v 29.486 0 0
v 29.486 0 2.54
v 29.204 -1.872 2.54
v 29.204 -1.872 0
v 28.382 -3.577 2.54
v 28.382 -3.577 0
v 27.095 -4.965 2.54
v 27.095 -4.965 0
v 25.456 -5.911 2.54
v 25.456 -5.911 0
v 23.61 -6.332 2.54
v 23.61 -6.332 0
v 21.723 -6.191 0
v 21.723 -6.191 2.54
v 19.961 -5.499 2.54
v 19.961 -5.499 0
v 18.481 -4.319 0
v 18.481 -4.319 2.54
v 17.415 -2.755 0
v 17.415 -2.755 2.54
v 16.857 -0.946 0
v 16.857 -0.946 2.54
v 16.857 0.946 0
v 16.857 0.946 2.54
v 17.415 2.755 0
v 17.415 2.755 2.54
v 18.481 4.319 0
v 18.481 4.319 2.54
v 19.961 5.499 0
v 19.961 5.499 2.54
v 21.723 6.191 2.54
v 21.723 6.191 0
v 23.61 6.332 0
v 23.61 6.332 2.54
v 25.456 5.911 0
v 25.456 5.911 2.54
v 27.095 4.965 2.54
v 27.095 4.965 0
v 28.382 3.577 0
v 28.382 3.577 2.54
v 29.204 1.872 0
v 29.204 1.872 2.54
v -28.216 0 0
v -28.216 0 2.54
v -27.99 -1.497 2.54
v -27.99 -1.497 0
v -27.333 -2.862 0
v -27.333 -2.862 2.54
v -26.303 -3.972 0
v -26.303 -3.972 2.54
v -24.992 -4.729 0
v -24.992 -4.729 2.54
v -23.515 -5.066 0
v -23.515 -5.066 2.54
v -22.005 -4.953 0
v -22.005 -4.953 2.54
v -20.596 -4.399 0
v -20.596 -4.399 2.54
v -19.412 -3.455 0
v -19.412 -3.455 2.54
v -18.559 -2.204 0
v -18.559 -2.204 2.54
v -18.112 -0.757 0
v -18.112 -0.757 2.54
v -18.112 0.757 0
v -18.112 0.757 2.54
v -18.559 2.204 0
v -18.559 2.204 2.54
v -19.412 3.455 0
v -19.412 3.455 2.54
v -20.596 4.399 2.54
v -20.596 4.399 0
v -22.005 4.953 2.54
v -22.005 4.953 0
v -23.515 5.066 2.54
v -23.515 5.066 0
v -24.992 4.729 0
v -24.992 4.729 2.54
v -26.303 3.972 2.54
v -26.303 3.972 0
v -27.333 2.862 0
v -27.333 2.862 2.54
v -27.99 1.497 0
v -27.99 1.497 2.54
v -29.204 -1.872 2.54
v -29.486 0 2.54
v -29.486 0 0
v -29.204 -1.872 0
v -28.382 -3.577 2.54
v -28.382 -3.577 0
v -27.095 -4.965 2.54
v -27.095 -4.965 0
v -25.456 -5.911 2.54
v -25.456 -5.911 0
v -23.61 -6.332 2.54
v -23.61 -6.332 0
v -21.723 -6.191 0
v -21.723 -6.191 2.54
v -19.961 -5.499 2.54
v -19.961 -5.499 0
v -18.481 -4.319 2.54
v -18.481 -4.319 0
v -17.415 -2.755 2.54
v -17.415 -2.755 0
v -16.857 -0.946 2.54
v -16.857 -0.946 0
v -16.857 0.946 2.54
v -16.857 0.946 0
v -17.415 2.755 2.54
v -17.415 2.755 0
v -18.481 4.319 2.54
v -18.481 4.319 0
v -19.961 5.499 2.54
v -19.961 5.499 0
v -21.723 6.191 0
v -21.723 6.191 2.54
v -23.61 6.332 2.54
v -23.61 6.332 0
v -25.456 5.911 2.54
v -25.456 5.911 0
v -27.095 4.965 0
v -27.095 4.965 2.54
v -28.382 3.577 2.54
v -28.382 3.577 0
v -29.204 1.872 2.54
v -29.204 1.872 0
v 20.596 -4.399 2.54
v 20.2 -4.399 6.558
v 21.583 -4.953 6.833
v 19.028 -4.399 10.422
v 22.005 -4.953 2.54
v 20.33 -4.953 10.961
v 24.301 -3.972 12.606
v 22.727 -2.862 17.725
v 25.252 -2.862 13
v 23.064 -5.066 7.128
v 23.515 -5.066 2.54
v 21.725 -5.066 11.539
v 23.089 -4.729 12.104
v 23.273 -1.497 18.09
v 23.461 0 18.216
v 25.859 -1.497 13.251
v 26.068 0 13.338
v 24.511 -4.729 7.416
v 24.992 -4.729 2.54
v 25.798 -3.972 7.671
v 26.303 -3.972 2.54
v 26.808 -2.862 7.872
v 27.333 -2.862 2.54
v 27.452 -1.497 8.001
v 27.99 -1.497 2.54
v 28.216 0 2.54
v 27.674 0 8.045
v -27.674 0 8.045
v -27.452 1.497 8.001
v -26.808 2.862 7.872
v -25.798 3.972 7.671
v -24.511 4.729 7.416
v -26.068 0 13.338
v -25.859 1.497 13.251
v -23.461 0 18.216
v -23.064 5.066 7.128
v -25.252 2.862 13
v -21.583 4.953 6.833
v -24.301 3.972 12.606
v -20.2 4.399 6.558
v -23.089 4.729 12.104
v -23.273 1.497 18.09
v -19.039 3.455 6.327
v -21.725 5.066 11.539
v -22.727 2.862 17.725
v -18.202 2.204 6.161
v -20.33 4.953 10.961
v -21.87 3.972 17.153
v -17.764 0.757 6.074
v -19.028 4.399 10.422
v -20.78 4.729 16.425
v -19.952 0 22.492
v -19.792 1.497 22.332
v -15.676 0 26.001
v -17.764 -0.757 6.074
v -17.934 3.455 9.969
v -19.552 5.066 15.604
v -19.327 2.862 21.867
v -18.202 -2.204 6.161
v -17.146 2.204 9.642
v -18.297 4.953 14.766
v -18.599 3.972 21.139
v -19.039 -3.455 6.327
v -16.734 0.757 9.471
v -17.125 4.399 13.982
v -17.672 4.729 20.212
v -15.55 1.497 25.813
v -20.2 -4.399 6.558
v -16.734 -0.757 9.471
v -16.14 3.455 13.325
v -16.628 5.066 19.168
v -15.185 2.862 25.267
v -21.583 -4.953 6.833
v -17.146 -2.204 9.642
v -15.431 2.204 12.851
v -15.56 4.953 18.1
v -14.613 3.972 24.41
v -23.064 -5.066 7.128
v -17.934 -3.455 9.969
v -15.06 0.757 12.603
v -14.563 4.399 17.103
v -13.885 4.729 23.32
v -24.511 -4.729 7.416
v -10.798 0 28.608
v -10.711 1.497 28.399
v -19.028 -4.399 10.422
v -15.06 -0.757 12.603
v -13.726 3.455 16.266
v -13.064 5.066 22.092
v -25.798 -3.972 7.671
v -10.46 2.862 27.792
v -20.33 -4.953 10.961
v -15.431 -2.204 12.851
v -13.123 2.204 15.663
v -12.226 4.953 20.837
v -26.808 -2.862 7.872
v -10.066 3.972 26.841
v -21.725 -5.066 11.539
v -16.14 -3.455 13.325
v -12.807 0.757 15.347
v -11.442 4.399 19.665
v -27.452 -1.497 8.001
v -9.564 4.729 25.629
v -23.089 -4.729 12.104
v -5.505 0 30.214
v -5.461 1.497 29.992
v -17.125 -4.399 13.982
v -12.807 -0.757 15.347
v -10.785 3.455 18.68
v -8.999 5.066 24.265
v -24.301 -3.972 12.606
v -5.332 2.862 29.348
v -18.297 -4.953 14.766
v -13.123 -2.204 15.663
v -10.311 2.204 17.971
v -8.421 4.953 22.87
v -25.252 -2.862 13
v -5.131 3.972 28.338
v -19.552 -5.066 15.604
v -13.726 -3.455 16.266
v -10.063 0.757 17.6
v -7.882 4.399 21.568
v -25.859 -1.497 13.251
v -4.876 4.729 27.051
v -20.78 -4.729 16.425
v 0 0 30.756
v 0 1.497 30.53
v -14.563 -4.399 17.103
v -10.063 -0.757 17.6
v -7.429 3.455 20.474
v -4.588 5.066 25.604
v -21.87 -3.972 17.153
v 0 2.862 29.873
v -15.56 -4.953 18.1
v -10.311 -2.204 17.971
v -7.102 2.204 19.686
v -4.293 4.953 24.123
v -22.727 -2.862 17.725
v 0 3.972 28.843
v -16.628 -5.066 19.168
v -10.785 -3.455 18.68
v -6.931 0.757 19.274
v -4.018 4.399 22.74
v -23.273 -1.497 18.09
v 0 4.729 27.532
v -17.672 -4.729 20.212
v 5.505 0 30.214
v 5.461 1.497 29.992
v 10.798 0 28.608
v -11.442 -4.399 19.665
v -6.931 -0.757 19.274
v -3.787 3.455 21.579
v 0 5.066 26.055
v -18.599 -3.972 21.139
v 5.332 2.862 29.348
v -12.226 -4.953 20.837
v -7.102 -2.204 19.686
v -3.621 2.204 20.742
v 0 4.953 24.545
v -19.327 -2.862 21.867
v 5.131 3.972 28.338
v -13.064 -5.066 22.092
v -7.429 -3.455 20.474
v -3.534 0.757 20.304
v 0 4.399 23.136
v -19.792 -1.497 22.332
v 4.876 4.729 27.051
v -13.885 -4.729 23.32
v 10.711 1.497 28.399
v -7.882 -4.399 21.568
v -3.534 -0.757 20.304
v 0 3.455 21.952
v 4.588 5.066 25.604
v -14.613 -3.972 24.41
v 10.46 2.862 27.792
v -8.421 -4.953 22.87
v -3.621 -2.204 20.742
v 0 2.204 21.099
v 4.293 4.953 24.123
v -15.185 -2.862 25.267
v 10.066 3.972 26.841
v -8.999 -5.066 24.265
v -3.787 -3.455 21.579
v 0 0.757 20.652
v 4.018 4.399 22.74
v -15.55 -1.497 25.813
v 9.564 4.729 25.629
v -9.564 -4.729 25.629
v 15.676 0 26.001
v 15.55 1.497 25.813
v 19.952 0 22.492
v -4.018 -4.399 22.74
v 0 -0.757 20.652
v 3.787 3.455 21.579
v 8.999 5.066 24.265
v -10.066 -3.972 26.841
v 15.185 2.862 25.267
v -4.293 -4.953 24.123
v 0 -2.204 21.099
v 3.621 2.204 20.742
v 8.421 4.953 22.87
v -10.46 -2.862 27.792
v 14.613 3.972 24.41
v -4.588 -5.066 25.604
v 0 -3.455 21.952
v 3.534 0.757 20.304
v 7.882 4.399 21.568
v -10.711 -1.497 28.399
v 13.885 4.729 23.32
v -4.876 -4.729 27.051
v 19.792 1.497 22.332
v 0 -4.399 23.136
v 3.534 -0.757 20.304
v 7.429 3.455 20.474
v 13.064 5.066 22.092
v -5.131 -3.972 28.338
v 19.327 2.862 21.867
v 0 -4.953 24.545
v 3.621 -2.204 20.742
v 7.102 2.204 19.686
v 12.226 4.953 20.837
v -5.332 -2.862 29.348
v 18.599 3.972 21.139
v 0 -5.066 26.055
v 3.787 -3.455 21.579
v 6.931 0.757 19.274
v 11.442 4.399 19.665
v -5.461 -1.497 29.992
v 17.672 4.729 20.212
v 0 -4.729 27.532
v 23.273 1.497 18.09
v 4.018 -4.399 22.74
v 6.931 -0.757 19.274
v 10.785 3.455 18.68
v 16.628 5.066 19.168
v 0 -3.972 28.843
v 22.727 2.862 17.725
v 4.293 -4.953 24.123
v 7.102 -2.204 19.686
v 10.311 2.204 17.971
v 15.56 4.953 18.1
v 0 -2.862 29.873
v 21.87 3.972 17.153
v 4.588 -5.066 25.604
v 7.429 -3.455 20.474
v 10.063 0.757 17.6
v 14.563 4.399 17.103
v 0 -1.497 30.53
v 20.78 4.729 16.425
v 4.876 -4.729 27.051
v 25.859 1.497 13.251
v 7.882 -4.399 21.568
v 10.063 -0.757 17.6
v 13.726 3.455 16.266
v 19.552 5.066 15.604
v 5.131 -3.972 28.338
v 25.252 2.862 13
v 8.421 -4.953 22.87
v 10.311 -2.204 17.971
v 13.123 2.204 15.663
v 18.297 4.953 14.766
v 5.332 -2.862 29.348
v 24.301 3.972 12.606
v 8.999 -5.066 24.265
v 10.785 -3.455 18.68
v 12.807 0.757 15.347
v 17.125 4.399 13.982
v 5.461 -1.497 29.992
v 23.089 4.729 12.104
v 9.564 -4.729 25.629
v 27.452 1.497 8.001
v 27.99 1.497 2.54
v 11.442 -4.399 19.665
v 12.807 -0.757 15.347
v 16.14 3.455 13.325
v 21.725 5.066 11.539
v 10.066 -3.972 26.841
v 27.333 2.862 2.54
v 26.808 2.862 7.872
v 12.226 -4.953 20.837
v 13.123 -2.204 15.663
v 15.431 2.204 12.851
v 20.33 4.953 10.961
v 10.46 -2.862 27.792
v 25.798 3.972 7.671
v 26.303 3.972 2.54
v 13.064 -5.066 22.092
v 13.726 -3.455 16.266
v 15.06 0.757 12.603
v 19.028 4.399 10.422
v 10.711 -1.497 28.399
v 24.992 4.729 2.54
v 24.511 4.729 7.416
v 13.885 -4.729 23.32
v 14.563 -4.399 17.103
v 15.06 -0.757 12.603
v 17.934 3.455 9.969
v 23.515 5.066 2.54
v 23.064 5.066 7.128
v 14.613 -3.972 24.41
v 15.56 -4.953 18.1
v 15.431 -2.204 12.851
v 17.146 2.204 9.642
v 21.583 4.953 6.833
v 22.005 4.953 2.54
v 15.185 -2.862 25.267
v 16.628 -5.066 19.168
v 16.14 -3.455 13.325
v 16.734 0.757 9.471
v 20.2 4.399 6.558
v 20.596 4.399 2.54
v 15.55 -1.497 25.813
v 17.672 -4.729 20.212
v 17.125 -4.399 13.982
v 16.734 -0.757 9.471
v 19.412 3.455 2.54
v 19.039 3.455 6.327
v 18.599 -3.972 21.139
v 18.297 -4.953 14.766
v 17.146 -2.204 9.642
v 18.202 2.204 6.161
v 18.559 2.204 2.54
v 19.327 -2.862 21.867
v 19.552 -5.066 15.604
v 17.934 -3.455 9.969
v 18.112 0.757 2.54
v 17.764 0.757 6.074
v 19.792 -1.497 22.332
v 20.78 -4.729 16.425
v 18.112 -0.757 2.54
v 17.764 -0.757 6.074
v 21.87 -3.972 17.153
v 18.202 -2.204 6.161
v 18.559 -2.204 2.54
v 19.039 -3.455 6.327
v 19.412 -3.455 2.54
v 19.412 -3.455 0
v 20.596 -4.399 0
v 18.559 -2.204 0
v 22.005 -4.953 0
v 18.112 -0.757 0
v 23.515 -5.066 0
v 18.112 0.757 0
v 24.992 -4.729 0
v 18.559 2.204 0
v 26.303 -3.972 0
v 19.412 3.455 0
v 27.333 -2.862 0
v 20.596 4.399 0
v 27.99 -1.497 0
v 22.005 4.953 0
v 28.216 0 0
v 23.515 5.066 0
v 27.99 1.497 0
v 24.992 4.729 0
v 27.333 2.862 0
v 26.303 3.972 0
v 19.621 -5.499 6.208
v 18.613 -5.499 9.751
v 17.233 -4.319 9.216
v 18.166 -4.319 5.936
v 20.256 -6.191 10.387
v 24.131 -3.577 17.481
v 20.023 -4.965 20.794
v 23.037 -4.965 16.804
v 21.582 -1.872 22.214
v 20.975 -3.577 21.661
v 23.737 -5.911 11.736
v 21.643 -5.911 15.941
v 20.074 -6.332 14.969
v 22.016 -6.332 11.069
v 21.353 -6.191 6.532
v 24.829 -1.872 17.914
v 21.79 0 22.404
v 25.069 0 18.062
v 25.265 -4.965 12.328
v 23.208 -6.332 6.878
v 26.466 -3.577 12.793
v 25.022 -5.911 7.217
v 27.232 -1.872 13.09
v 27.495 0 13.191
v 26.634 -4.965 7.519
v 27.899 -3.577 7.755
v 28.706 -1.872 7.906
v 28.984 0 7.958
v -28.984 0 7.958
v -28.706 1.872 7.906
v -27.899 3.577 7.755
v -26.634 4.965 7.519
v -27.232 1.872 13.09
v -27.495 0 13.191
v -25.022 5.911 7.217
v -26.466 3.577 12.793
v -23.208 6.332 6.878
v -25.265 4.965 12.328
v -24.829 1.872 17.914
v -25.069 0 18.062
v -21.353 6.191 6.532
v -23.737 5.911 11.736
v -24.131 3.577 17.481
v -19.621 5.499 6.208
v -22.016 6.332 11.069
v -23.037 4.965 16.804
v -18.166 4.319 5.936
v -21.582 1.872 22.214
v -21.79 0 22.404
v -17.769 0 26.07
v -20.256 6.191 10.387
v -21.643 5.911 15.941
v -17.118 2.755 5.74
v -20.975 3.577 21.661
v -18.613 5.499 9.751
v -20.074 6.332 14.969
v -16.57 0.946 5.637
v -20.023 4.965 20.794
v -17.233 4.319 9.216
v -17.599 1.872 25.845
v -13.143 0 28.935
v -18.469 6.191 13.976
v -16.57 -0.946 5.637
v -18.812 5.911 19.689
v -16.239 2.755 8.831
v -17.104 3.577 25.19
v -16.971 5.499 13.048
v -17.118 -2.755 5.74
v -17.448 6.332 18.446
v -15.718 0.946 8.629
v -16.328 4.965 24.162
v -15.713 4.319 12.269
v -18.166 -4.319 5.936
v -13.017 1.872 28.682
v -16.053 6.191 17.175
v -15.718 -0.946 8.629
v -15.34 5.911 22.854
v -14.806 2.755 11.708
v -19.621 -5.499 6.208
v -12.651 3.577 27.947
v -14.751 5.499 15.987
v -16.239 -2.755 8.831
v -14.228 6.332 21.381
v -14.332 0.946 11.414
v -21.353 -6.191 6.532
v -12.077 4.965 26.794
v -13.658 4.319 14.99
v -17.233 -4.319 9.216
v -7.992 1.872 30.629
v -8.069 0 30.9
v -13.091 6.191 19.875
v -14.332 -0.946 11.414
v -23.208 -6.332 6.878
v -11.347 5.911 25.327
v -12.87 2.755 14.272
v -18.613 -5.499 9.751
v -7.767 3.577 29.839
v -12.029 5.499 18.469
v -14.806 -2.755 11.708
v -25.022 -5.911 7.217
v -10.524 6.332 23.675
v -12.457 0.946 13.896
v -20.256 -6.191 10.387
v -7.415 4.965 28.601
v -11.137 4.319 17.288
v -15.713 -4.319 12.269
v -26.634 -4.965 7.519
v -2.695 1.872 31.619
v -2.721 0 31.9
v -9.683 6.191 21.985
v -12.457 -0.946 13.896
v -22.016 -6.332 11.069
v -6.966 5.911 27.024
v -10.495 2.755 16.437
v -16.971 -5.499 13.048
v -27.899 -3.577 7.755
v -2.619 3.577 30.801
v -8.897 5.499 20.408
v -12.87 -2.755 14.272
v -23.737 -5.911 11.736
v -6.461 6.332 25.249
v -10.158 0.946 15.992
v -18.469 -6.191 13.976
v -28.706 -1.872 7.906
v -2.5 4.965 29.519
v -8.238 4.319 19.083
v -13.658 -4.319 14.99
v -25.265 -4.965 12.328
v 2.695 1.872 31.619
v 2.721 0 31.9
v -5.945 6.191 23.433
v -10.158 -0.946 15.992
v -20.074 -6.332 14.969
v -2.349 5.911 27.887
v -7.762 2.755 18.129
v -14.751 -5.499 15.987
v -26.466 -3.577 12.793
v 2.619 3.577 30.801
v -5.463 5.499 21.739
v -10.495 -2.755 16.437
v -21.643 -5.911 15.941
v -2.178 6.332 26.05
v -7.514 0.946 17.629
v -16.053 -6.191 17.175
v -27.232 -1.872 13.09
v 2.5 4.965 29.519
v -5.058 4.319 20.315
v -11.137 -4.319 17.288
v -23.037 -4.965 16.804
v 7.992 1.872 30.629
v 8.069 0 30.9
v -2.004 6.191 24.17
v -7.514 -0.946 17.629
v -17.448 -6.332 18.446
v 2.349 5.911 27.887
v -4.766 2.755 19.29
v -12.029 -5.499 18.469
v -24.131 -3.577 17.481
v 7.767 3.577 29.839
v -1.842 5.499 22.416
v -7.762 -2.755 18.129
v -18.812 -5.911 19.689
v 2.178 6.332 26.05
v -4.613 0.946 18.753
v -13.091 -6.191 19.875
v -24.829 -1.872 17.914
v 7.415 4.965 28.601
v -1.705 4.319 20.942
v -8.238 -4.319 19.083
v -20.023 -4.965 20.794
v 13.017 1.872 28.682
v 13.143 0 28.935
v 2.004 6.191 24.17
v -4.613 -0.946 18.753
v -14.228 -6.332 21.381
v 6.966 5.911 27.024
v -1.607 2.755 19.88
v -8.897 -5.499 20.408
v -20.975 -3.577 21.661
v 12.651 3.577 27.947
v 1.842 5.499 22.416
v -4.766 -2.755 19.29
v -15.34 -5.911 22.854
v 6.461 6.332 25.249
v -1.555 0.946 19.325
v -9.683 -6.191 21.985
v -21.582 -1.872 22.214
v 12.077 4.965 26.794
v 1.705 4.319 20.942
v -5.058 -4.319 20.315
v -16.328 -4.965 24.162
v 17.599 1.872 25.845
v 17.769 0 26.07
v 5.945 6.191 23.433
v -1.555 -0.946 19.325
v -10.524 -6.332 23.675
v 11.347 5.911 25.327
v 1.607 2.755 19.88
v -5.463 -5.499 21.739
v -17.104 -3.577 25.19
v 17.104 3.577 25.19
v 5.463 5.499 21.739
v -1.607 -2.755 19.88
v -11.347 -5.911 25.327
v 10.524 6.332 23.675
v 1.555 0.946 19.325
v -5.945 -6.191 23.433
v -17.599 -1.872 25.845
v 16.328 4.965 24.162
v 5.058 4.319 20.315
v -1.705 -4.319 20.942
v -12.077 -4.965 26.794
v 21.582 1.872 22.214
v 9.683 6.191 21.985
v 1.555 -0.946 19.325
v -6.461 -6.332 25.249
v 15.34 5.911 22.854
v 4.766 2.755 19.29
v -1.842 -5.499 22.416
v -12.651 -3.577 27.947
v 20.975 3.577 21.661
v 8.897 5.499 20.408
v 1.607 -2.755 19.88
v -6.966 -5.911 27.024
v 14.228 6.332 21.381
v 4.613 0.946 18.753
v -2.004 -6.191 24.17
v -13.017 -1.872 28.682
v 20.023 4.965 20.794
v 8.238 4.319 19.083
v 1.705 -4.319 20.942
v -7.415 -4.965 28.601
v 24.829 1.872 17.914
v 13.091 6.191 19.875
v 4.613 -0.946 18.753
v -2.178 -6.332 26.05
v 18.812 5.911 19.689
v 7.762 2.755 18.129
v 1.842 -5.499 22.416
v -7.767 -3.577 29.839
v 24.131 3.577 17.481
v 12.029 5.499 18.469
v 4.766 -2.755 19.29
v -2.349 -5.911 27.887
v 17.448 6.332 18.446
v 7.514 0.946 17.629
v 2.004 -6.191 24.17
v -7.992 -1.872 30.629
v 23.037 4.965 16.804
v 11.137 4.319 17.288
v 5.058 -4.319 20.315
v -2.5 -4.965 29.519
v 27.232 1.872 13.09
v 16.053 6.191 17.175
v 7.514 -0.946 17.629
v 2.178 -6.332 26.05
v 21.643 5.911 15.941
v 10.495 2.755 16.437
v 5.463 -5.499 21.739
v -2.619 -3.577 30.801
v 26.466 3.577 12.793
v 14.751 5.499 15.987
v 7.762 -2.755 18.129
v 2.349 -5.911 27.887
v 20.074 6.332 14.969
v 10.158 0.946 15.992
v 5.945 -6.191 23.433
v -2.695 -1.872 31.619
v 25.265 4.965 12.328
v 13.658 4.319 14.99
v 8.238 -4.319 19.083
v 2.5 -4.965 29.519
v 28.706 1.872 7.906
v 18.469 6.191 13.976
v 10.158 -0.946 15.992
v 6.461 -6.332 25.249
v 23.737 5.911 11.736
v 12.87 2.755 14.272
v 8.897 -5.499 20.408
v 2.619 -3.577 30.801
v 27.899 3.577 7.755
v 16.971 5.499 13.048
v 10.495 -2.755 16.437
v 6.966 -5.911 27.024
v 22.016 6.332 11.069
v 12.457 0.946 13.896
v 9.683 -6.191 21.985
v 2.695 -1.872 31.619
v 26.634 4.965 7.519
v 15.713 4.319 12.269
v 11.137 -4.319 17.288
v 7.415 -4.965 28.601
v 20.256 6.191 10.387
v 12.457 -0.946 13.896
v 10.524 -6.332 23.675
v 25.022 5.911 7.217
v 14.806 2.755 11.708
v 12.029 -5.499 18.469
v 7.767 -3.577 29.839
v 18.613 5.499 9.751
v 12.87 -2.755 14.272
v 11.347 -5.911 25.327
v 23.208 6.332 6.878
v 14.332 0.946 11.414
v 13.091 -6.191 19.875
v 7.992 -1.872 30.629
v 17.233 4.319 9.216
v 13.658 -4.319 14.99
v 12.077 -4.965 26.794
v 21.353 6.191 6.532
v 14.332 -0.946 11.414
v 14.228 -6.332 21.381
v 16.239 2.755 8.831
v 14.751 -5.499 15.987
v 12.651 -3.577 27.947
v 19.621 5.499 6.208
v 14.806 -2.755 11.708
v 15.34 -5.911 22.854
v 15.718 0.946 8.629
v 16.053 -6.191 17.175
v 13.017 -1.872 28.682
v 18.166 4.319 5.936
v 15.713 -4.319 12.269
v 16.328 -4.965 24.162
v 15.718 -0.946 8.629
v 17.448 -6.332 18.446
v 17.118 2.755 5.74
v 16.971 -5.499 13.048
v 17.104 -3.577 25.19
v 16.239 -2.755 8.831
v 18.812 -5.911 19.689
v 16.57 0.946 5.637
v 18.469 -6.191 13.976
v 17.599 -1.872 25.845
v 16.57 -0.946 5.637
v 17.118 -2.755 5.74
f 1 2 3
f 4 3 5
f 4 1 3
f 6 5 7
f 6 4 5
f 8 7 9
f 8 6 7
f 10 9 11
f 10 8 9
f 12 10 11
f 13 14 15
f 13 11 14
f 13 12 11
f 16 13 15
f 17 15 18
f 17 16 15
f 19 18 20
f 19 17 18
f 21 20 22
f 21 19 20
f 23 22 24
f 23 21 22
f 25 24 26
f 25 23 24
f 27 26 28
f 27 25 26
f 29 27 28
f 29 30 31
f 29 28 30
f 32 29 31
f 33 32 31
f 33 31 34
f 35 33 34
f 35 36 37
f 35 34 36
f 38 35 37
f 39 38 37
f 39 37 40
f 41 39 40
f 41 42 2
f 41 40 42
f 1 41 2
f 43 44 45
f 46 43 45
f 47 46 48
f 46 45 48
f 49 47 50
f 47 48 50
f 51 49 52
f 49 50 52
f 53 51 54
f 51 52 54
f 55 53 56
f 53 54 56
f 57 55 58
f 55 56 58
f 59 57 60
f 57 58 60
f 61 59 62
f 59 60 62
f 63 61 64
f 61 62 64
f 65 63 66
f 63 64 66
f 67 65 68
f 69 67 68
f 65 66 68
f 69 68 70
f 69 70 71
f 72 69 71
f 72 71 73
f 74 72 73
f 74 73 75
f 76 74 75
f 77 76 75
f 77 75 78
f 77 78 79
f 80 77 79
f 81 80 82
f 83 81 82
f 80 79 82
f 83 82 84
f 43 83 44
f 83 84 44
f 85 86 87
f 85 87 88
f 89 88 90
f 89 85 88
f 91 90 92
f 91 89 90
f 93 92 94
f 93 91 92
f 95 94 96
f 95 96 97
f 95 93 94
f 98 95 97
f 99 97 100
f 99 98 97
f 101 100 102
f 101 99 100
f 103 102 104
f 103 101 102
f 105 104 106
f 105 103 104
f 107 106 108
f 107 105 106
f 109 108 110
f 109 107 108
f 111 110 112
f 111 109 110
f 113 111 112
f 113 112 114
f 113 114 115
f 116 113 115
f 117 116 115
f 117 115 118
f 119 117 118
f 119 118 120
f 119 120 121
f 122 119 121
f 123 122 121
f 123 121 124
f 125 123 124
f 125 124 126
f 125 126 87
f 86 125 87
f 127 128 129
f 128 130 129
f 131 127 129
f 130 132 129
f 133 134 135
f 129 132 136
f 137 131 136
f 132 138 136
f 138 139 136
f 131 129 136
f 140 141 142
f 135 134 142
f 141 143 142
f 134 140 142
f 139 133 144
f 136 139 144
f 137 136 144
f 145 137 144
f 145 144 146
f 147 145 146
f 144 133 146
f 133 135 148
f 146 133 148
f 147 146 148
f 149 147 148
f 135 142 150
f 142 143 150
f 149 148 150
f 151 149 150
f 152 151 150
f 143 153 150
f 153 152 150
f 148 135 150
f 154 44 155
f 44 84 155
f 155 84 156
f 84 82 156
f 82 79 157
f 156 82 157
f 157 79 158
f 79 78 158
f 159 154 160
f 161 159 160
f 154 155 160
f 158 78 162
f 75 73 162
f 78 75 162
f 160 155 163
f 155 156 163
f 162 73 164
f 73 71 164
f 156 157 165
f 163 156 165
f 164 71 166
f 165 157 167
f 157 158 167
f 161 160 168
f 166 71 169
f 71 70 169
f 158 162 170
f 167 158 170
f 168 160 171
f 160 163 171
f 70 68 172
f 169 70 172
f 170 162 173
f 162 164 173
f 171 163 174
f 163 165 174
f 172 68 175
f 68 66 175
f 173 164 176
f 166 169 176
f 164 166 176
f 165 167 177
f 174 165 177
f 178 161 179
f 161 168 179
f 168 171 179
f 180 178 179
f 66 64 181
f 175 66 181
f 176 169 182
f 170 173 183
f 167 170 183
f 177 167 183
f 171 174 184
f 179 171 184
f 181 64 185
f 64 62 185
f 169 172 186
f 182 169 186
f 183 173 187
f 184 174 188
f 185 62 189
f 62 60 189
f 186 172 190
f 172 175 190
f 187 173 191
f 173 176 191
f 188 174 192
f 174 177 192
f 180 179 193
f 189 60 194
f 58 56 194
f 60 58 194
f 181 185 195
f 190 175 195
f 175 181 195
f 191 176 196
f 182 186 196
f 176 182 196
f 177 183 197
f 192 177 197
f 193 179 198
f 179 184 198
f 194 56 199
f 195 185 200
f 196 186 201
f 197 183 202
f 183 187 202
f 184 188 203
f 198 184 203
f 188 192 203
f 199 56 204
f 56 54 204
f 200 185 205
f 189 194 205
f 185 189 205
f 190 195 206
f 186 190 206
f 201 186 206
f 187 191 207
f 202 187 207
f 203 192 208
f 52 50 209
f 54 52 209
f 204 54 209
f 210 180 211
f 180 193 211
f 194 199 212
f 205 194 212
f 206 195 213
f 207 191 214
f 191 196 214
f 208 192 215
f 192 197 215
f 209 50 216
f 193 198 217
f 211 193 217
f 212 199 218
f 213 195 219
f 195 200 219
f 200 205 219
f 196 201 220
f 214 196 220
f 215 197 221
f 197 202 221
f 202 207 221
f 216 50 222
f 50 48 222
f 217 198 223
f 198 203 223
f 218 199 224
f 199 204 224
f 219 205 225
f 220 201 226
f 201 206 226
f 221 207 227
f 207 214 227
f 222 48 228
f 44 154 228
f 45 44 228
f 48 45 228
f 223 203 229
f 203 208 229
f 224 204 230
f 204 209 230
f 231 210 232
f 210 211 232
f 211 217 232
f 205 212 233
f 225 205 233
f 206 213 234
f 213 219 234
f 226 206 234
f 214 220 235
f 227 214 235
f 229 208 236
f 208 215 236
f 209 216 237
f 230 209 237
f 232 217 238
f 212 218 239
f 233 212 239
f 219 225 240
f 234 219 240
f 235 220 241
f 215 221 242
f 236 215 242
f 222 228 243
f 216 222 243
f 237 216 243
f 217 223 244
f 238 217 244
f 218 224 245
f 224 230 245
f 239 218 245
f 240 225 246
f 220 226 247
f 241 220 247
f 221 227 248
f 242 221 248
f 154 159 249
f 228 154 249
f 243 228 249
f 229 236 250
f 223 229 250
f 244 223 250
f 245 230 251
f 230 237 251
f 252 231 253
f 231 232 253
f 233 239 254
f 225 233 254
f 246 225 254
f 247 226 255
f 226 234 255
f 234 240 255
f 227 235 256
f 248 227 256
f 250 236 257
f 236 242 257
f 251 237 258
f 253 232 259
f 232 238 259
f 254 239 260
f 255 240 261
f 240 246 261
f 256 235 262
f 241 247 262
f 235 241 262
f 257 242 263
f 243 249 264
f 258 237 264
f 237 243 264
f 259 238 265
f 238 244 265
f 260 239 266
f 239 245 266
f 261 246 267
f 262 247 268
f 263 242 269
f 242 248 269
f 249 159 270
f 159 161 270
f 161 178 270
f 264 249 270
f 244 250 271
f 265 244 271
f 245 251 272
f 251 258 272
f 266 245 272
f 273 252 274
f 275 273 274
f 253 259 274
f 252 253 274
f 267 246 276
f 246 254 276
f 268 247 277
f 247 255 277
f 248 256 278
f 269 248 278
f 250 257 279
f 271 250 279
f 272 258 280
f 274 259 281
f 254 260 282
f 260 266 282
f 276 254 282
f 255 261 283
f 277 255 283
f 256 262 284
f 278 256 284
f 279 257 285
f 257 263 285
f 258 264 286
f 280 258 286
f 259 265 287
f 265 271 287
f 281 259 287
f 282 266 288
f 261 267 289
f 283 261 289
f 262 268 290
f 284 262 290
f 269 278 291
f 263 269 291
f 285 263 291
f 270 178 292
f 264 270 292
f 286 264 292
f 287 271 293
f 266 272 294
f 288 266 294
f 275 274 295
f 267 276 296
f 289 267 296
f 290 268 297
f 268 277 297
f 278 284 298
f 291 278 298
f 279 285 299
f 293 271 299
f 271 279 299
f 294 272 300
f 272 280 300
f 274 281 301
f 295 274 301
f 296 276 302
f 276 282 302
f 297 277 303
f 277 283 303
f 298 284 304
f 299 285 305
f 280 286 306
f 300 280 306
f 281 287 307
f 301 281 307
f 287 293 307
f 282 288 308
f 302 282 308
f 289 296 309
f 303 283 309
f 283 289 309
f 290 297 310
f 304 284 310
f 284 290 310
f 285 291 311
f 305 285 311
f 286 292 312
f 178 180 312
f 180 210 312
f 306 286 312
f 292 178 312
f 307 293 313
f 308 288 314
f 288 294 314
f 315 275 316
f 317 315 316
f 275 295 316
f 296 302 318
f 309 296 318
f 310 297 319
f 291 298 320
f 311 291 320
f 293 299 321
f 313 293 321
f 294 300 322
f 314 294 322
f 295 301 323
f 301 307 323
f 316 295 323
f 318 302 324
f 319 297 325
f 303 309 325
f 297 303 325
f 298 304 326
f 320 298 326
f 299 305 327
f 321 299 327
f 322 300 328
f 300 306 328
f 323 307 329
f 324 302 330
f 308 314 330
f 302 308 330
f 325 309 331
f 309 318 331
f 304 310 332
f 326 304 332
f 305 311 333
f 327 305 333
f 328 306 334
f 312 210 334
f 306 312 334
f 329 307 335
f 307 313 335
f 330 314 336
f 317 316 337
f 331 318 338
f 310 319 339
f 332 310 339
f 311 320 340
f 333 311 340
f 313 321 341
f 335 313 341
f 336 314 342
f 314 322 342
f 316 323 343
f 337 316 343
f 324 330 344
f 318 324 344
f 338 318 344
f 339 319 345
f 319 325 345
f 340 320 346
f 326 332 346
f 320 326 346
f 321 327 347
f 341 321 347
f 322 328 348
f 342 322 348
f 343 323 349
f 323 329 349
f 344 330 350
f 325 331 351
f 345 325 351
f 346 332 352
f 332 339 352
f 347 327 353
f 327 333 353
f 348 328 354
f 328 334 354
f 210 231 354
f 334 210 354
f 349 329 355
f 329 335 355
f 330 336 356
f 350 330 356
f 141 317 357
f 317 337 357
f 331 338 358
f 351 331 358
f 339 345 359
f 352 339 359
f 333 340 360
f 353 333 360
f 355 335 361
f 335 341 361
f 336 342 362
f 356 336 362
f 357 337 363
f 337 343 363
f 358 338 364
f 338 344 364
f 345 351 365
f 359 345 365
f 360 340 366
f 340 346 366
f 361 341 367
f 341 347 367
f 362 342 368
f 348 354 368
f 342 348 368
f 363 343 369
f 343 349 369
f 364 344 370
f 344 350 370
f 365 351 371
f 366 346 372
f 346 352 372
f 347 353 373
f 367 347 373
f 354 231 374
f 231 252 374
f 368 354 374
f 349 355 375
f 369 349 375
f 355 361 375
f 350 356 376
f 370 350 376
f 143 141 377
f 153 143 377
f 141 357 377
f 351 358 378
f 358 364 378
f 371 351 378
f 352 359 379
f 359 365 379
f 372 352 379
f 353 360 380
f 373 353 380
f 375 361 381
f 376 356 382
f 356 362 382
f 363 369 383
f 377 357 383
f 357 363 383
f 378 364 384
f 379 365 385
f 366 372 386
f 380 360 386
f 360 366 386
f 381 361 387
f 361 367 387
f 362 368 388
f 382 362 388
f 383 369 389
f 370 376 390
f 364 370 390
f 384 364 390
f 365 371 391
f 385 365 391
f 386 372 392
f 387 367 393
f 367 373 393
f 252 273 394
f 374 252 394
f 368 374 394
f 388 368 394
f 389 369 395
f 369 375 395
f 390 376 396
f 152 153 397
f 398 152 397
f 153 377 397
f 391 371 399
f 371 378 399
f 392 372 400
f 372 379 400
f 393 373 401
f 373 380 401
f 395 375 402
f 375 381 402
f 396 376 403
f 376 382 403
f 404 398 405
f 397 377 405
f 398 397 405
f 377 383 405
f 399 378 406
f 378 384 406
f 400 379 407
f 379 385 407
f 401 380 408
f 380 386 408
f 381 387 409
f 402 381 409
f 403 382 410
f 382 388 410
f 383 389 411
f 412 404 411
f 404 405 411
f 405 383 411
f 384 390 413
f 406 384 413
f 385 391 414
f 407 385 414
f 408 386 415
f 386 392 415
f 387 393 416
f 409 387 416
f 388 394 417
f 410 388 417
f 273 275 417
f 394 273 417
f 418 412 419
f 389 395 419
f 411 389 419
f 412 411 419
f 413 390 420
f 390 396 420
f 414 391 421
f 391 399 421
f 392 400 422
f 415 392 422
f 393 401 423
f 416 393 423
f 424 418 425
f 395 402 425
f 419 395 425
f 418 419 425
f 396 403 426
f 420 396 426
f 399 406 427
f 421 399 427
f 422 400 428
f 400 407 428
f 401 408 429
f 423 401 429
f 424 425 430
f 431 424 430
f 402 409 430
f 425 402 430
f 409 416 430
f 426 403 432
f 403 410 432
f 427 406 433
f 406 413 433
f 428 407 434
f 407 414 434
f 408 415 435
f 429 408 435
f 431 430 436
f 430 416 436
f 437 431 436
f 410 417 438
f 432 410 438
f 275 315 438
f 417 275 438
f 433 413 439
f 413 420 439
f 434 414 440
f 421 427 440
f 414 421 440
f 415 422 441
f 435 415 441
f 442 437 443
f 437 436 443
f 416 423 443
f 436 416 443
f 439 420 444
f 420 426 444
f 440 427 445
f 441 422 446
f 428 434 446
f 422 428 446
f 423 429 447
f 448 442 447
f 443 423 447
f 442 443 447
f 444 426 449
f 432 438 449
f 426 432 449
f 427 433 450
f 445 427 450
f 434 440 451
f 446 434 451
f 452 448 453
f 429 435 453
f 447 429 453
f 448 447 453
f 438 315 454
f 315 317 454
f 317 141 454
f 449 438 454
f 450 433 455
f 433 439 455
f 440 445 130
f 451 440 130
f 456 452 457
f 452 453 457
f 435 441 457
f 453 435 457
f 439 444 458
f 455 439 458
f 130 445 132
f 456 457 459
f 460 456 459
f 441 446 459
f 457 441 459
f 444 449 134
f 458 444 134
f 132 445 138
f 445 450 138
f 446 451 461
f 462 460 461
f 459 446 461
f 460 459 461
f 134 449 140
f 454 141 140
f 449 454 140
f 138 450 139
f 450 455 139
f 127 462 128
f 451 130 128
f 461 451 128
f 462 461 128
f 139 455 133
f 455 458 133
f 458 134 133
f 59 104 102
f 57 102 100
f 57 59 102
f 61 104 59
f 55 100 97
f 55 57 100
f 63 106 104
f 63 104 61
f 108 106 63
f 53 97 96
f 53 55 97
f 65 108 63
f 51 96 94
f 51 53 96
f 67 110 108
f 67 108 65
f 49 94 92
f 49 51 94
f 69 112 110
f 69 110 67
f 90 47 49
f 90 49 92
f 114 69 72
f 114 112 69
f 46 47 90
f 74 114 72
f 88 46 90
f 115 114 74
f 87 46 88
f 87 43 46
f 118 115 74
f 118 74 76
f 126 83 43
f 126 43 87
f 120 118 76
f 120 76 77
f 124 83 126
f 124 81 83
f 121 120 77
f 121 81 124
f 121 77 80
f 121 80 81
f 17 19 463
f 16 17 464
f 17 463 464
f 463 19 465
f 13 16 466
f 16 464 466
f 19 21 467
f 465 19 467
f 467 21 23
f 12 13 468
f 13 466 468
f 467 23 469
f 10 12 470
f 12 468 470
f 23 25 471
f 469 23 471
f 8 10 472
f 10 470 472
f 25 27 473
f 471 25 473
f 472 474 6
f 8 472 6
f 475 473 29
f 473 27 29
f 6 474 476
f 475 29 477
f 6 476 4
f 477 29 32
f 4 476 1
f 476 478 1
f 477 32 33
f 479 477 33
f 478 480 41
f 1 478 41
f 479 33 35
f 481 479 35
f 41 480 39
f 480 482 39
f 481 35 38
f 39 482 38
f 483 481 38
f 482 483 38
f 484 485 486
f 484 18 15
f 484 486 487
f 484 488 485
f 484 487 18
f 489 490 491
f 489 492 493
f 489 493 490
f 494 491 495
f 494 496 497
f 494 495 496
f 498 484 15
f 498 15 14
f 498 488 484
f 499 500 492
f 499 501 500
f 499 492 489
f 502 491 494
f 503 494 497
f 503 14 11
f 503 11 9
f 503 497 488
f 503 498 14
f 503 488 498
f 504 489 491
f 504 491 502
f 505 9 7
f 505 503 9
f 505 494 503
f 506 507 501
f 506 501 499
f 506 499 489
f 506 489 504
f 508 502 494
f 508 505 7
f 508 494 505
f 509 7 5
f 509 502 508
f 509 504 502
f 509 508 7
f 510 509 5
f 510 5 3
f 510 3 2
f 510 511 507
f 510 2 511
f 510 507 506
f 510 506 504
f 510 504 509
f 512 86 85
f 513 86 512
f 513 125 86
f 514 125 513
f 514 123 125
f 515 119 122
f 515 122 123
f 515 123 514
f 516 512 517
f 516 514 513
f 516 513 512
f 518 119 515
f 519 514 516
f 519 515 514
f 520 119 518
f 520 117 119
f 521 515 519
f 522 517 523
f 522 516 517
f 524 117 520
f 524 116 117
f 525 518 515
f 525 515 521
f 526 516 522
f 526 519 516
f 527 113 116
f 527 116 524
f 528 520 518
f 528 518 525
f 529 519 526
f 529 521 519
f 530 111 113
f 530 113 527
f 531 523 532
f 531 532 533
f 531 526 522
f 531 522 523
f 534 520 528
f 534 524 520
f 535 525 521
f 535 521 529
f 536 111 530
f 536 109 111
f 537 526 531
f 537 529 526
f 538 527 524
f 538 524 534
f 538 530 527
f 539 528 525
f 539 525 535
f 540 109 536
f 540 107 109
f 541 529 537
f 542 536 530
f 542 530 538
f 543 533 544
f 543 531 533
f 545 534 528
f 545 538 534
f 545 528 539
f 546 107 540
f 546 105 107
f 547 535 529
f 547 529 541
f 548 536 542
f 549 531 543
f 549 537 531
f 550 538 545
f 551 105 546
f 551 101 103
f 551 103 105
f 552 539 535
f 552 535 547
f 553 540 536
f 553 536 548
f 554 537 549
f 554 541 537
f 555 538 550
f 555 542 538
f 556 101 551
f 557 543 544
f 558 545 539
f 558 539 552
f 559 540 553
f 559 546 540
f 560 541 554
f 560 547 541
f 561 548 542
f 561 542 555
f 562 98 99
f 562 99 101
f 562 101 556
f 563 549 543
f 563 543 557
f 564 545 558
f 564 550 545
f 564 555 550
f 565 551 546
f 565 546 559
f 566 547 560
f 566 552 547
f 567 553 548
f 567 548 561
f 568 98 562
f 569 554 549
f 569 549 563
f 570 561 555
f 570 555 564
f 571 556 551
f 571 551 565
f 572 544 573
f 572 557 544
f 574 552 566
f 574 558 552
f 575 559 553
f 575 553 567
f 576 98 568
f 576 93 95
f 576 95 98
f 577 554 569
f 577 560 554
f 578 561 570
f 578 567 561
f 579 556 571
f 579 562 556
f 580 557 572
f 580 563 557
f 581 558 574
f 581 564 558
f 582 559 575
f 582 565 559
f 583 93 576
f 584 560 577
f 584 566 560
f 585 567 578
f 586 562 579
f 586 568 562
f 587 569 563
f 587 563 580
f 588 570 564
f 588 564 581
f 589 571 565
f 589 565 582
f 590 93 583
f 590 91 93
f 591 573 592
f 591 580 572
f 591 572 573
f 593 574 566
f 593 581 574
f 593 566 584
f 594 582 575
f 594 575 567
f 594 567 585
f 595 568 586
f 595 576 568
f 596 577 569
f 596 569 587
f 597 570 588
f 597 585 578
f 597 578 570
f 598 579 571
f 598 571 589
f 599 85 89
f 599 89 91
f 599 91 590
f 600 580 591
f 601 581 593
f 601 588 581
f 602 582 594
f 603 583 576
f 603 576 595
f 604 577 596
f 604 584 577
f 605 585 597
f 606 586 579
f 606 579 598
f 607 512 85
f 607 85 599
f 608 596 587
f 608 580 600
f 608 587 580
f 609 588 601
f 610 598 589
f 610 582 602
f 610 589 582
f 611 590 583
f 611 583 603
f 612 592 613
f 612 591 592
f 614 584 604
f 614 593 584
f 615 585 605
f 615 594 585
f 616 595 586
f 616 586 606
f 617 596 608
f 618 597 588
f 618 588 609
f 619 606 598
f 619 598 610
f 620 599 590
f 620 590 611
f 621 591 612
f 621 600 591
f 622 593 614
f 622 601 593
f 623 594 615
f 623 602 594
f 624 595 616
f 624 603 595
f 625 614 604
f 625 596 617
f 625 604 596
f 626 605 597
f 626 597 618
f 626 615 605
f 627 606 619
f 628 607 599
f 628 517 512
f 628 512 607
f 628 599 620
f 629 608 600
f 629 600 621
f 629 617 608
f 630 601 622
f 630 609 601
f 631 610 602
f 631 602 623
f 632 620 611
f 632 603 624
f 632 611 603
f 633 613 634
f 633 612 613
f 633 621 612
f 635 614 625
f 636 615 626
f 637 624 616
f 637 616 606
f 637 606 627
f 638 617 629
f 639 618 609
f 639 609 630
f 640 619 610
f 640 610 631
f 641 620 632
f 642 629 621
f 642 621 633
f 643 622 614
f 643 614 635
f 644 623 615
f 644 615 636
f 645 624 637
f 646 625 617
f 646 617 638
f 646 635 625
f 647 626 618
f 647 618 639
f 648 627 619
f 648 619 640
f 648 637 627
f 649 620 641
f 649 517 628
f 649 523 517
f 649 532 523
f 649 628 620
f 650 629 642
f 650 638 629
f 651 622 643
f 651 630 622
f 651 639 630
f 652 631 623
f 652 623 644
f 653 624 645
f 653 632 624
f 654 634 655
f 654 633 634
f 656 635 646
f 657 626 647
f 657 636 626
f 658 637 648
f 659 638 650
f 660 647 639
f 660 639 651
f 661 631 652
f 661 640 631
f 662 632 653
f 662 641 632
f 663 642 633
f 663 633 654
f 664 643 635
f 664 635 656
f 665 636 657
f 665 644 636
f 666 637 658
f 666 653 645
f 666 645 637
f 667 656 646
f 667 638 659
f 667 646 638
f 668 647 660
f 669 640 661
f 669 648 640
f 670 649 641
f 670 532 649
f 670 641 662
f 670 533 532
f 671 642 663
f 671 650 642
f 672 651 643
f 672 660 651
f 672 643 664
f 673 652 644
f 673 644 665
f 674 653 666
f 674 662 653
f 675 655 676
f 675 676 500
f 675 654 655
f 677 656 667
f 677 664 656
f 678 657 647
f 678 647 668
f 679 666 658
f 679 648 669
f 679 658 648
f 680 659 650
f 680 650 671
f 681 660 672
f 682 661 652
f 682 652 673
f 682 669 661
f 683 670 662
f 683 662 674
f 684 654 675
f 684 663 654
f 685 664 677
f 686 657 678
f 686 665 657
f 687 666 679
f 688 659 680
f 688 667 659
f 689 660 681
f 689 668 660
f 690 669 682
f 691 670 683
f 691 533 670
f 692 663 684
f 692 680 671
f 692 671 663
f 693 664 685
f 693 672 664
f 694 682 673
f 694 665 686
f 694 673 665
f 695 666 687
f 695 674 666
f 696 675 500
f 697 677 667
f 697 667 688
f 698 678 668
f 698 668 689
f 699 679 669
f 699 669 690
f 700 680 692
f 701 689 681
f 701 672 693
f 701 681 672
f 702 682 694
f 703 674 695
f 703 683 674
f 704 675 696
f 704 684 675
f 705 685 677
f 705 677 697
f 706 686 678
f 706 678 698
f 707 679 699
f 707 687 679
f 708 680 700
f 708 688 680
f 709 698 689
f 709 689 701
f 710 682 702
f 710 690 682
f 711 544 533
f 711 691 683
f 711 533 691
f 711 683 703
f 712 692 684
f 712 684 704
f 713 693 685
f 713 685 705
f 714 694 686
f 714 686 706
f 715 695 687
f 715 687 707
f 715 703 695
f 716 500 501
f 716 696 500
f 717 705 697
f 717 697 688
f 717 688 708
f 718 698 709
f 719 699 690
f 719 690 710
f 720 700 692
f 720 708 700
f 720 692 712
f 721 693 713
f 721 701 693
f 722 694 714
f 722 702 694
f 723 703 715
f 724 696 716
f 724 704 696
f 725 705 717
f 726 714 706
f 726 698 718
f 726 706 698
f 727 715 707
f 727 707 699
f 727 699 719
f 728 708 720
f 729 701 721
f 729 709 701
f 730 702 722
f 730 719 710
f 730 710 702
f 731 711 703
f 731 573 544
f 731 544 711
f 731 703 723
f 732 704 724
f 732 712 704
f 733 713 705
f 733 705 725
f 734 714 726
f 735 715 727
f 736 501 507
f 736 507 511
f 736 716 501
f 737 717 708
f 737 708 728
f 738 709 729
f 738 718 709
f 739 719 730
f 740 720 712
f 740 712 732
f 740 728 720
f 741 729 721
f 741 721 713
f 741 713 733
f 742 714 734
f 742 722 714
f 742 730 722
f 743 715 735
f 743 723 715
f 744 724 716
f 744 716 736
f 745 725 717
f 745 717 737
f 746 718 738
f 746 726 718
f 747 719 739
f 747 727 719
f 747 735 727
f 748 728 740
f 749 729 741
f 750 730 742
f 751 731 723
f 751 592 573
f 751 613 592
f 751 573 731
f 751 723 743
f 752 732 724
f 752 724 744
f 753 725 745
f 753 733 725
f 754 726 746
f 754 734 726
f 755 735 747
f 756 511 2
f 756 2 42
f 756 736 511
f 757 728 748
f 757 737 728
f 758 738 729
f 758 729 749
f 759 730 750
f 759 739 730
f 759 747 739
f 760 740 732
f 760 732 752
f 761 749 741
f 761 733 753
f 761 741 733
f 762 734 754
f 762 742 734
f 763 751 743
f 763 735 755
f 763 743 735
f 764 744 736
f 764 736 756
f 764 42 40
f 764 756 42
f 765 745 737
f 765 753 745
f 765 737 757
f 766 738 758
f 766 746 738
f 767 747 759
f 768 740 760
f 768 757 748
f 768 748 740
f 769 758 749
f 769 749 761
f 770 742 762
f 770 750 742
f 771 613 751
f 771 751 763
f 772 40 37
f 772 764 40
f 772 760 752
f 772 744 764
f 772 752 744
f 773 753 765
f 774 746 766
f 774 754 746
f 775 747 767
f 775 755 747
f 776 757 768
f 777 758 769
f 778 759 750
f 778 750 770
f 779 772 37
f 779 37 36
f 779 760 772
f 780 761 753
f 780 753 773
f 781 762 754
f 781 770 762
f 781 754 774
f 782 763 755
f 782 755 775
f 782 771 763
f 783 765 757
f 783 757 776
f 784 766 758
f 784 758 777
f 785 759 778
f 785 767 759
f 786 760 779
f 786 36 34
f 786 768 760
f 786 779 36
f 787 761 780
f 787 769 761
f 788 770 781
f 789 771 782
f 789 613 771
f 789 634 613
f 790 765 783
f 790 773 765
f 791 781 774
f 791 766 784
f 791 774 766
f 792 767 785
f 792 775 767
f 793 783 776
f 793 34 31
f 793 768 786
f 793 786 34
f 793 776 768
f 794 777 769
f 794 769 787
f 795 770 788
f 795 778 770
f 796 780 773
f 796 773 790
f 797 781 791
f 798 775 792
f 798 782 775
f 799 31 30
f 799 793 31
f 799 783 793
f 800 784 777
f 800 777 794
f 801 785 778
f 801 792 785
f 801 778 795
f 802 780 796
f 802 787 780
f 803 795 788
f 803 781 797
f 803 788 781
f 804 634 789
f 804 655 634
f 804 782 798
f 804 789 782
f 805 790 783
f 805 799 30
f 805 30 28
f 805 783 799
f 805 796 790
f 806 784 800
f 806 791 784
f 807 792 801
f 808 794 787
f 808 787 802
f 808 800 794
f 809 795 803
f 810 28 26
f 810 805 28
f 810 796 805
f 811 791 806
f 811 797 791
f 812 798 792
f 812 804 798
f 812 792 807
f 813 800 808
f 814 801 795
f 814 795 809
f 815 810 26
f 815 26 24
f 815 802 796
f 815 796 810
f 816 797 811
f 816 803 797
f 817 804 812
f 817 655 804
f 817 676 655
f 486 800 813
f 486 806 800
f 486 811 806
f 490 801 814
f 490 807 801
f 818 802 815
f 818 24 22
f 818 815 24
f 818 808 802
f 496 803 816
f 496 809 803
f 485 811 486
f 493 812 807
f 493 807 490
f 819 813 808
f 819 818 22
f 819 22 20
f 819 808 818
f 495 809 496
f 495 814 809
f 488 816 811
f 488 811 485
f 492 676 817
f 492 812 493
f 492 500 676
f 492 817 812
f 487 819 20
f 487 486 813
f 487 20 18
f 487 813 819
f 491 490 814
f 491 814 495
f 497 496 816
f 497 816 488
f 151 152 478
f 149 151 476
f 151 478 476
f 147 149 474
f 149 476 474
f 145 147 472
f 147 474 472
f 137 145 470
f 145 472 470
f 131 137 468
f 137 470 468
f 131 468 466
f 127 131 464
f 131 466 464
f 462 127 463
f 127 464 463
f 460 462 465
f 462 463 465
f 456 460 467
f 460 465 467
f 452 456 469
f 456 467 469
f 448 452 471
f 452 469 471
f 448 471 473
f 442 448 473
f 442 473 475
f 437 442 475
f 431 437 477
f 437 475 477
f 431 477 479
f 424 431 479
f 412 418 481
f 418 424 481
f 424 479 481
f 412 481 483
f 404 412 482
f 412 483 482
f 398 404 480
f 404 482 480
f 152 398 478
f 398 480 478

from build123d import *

# Parameters (mm, degrees)
F1_R = 6.35
F3_T = -1.27


with BuildPart() as f2:
    # F2: sweep along a path in F0
    with BuildLine(Plane.XZ) as f2_path:
        Line((-23.1357552849, 0), (-23.1357552849, 2.54))
        ThreePointArc((-23.1357552849, 2.54), (0, 25.6757552849), (23.1357552849, 2.54))
        Line((23.1357552849, 2.54), (23.1357552849, 0))
    # F1 (on Top) → F2 (sweep)
    with BuildSketch(Plane.XY):
        with Locations((23.1357552849, 0)):
            Circle(F1_R)
    sweep(path=f2_path.line)

    # F3
    f3_openings = [f2.faces().sort_by_distance(p)[0] for p in [
        (-23.135755, 0, 0),
        (23.135755, 0, 0),
    ]]
    offset(amount=F3_T, openings=f3_openings)


solid = f2.part
